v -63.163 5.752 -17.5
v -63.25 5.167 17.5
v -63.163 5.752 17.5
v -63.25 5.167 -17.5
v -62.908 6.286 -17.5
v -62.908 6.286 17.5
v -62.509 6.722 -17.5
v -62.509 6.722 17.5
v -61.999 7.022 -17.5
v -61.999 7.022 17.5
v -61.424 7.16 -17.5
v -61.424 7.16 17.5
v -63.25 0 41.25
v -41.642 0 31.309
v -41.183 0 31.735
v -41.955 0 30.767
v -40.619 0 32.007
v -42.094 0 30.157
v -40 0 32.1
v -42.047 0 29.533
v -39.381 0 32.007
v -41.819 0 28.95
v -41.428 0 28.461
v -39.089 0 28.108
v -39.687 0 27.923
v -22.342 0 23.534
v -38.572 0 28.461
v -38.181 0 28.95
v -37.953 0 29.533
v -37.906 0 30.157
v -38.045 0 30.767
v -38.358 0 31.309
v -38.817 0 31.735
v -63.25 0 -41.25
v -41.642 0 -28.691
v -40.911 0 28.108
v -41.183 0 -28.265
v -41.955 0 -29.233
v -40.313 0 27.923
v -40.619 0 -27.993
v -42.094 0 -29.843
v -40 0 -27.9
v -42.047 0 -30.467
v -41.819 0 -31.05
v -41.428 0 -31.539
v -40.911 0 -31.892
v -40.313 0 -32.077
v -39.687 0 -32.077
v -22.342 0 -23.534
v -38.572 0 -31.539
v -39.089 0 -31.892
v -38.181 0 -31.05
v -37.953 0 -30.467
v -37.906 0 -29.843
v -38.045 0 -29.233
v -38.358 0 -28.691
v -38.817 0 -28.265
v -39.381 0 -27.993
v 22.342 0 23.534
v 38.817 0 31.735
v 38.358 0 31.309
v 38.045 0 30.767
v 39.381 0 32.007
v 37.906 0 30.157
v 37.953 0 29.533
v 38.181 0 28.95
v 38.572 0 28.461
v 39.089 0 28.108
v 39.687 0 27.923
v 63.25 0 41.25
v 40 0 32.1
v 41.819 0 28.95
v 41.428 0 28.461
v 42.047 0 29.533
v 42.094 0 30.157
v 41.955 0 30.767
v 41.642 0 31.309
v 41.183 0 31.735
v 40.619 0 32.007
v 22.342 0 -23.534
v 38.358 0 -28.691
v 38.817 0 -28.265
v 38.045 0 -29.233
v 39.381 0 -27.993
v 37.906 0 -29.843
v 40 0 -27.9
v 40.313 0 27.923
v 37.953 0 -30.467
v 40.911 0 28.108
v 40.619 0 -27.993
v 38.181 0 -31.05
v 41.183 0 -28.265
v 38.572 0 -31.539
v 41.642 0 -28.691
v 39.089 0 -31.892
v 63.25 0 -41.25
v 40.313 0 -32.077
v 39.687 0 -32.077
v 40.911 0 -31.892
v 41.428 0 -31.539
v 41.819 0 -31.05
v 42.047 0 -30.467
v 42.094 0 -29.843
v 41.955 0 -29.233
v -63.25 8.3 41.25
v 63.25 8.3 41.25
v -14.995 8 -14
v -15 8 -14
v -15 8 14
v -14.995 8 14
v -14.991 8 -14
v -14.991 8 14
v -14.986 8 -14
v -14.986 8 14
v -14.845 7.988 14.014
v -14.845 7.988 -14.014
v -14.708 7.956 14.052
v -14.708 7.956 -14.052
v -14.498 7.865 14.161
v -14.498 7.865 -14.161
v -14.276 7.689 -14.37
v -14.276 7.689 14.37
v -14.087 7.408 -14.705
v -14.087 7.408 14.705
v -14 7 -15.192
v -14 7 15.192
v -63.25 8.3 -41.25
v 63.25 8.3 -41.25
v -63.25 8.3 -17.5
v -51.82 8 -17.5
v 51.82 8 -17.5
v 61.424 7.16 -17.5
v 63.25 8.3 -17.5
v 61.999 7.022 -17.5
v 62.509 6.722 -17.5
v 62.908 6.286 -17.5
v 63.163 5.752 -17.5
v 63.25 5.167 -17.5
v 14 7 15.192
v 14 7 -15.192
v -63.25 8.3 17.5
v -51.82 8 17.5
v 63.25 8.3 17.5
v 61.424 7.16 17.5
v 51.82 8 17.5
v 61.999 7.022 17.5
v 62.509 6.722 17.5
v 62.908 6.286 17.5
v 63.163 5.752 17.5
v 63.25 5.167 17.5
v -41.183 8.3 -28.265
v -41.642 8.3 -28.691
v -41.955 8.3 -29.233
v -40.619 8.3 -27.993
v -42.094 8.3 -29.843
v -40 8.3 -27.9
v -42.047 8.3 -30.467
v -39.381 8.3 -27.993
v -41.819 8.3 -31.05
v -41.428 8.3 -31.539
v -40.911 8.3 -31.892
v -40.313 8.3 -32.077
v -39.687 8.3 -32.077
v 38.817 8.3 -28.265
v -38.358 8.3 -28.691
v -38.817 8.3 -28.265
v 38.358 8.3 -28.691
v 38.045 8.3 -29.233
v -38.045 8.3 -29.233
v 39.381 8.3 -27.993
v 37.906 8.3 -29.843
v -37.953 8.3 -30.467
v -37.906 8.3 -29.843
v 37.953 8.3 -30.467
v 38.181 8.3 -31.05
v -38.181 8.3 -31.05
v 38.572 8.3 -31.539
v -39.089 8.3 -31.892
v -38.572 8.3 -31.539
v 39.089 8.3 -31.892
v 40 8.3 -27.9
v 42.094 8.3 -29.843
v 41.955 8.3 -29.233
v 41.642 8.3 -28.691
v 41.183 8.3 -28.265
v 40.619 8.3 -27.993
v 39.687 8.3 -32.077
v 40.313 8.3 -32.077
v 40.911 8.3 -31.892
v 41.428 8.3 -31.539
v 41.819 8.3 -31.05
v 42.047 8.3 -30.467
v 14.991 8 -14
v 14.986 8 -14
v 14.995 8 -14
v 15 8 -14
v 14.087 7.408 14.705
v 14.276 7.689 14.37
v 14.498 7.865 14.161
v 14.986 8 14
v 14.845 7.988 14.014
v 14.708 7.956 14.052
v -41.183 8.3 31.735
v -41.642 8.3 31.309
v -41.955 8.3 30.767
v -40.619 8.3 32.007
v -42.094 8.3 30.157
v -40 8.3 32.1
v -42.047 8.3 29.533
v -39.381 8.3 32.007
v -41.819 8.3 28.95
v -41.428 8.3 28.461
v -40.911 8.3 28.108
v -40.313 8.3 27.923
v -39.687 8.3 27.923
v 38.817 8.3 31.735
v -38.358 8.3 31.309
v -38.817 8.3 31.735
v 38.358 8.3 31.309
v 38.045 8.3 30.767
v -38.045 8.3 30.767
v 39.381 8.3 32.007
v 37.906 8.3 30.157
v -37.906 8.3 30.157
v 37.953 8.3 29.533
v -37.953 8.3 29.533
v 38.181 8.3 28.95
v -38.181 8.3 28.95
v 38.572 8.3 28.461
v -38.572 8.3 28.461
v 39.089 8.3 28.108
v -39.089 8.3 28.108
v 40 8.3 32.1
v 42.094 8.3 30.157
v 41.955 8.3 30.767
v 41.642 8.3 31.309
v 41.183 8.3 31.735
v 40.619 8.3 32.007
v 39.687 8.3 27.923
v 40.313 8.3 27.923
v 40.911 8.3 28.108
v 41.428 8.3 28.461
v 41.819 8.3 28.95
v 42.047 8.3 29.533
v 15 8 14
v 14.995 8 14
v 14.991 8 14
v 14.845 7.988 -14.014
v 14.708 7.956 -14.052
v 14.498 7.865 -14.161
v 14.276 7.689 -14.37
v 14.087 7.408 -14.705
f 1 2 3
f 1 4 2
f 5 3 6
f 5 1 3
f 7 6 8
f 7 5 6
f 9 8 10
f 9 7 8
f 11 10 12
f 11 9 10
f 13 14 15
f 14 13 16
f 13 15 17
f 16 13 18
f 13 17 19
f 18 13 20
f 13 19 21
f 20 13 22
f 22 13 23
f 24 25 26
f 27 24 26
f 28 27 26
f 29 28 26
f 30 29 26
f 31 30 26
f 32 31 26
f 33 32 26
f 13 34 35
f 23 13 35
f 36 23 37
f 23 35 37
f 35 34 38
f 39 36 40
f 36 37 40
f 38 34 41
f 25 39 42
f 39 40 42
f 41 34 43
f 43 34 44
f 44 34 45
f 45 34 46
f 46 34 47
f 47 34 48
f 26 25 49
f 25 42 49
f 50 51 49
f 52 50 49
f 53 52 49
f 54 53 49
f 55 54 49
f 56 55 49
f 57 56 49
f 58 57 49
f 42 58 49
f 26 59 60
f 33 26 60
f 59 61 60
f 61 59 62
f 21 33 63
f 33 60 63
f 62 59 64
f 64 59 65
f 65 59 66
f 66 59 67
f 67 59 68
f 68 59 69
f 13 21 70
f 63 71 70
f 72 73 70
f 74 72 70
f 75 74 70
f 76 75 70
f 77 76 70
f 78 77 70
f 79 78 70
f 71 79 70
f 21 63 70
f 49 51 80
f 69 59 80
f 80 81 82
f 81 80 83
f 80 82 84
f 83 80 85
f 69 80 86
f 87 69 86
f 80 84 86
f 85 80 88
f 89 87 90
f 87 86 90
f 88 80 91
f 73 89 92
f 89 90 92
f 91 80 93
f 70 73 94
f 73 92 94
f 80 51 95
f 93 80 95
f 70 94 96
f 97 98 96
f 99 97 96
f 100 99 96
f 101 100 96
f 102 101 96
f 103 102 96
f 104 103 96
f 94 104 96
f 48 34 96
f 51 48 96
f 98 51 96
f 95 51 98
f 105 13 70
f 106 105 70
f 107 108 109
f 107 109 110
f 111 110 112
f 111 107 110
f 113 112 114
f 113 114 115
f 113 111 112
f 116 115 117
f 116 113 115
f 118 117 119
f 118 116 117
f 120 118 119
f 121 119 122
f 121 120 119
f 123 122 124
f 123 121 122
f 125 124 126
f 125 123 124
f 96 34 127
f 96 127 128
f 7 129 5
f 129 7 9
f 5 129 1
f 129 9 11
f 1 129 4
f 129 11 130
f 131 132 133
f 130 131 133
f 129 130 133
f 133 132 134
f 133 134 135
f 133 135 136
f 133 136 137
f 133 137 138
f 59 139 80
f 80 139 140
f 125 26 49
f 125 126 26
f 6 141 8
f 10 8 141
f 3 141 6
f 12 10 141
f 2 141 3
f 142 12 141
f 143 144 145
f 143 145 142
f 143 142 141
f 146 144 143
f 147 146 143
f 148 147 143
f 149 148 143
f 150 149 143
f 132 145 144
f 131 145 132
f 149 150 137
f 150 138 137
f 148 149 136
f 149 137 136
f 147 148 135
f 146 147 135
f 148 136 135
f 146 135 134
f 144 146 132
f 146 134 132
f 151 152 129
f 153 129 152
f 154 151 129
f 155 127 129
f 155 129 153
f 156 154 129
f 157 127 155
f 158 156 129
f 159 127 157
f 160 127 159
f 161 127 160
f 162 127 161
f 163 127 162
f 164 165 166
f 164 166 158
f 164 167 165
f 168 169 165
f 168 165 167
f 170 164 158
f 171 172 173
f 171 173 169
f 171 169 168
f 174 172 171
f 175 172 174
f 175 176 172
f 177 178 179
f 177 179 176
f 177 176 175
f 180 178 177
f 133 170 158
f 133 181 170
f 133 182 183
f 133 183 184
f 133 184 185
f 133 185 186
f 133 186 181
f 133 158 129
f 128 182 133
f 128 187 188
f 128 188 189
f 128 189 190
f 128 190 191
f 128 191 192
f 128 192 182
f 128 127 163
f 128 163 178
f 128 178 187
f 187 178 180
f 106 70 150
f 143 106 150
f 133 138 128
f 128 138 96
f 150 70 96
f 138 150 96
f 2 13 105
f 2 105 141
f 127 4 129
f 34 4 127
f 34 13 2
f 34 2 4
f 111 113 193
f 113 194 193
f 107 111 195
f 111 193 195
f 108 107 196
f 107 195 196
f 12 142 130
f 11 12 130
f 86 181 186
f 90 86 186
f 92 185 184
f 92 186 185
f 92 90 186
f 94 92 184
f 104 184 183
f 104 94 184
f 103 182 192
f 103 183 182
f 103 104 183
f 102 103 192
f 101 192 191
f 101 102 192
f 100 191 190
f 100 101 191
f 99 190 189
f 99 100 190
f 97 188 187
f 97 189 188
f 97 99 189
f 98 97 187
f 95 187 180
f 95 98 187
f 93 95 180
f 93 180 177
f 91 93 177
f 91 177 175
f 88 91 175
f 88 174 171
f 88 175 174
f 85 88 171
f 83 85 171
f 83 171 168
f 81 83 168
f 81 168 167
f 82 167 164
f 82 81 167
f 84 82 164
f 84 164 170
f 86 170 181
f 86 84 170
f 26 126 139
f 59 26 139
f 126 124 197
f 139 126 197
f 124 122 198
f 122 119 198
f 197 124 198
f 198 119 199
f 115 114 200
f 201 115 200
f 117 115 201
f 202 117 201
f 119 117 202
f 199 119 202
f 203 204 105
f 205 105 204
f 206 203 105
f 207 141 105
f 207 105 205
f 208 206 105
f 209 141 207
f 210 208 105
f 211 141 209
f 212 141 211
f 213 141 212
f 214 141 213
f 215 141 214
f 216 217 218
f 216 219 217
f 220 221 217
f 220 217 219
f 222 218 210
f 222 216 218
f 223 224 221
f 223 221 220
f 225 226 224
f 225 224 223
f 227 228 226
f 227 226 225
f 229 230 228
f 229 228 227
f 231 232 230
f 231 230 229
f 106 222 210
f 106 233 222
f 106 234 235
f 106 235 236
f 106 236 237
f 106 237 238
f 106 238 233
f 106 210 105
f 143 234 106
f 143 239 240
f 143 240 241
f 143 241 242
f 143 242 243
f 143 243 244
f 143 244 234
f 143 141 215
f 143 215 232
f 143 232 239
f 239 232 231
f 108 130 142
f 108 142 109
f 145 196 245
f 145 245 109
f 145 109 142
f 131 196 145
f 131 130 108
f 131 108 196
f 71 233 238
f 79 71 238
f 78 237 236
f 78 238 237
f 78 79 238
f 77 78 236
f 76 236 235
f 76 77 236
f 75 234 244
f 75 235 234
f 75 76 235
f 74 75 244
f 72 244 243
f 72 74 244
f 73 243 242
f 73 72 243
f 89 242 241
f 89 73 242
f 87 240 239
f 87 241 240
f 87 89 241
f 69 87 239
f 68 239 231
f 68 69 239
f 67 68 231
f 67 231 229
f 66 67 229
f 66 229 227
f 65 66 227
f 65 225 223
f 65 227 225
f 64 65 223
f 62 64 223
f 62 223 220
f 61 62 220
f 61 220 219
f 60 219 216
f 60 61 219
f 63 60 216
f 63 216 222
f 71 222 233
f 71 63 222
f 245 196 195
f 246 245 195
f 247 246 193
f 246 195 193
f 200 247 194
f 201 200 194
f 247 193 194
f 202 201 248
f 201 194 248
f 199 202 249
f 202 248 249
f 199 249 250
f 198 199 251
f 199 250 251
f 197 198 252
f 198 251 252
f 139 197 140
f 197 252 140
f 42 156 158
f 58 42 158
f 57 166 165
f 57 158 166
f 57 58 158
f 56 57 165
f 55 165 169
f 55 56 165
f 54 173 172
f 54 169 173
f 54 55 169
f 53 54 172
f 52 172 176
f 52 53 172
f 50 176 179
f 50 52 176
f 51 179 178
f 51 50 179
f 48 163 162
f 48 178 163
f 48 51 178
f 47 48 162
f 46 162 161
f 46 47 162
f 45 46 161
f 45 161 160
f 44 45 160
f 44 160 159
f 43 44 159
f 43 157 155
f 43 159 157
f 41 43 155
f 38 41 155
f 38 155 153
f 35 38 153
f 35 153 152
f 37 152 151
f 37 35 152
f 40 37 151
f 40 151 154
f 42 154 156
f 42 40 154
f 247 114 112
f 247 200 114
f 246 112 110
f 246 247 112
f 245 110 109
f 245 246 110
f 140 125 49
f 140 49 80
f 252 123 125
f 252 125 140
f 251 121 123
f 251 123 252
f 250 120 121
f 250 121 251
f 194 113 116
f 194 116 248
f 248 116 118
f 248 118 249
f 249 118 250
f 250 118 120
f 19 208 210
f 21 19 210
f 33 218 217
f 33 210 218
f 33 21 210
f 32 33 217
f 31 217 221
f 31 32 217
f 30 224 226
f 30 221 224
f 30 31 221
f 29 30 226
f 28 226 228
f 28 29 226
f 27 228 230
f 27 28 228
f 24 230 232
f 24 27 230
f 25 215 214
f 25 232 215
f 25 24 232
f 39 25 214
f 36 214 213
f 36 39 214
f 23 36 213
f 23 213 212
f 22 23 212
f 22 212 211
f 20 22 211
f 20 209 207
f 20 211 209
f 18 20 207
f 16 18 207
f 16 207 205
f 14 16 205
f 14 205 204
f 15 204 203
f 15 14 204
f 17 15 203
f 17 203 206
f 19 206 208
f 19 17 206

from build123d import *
from OCP.BRepFilletAPI import BRepFilletAPI_MakeChamfer

# Parameters (mm, degrees)
SKETCH_1_W               = 126.5
SKETCH_1_H               = 82.5
SKETCH_1_W_2             = 28
SKETCH_1_H_2             = 28
EXTRUDE_1_DEPTH          = 8
SKETCH_2_W               = 126.5
SKETCH_2_H               = 23.75
EXTRUDE_2_DEPTH          = 0.3
CHAMFER_1_SIZE           = 1
CHAMFER_1_SIZE2          = 11.430052303
FILLET_1_R               = 2
FILLET_2_R               = 1
CUT_EXTRUDE_1_DEPTH      = 76.935005103
CUT_EXTRUDE_1_DEPTH_BACK = 76.935005103
SKETCH_3_R               = 2.1
CHAMFER_2_SIZE           = 8.342275148
CHAMFER_2_SIZE_2         = 7
CHAMFER_3_SIZE2          = 8
CHAMFER_3_SIZE           = 9.534028741


with BuildPart() as part:
    # Эскиз1 → Бобышка-Вытянуть1 (new body)
    with BuildSketch(Plane(origin=(0, 0, 0), x_dir=(1, 0, 0), z_dir=(0, 1, 0))):
        Rectangle(SKETCH_1_W, SKETCH_1_H)
        Rectangle(SKETCH_1_W_2, SKETCH_1_H_2, mode=Mode.SUBTRACT)
    extrude(amount=EXTRUDE_1_DEPTH)

    # Эскиз2 → Бобышка-Вытянуть2 (add)
    with BuildSketch(Plane(origin=(0, 8, 0), x_dir=(1, 0, 0), z_dir=(0, 1, 0))):
        with Locations((0, 29.375)):
            Rectangle(SKETCH_2_W, SKETCH_2_H)
        with Locations((0, -29.375)):
            Rectangle(SKETCH_2_W, SKETCH_2_H)
    extrude(amount=EXTRUDE_2_DEPTH)

    # Фаска1: one chamfer whose edges measure the first distance from different faces: ONE call of the kernel's chamfer builder (chamfer() names one face for all edges)
    chamfer_1_edges_1 = [part.edges().sort_by_distance(p)[0] for p in [
        (-63.25, 8, 0),
    ]]
    chamfer_1_side_1 = [part.faces().sort_by_distance(p)[0] for p in [
        (-63.25, 4.087708565, 0),
    ]]
    chamfer_1_edges_2 = [part.edges().sort_by_distance(p)[0] for p in [
        (63.25, 8, 0),
    ]]
    chamfer_1_side_2 = [part.faces().sort_by_distance(p)[0] for p in [
        (63.25, 4.087708565, 0),
    ]]
    chamfer_1 = BRepFilletAPI_MakeChamfer(part.part.solid().wrapped)
    for e in chamfer_1_edges_1:
        chamfer_1.Add(CHAMFER_1_SIZE, CHAMFER_1_SIZE2, e.wrapped, chamfer_1_side_1[0].wrapped)  # the first distance lies on this face
    for e in chamfer_1_edges_2:
        chamfer_1.Add(CHAMFER_1_SIZE, CHAMFER_1_SIZE2, e.wrapped, chamfer_1_side_2[0].wrapped)  # the first distance lies on this face
    add(Compound.cast(chamfer_1.Shape()), mode=Mode.REPLACE)

    # Скругление1
    fillet_1_edges = [part.edges().sort_by_distance(p)[0] for p in [
        (63.25, 7, 0),
        (-63.25, 7, 0),
    ]]
    fillet(fillet_1_edges, radius=FILLET_1_R)

    # Скругление2
    fillet_2_edges = [part.edges().sort_by_distance(p)[0] for p in [
        (-14, 8, 0),
        (14, 8, 0),
    ]]
    fillet(fillet_2_edges, radius=FILLET_2_R)

    # Эскиз3 → Вырез-Вытянуть1 (cut, two sides: drawn at the far end of the back side and taken through both)
    with BuildSketch(Plane(origin=(0, 8, 0), x_dir=(1, 0, 0), z_dir=(0, 1, 0)).offset(-CUT_EXTRUDE_1_DEPTH_BACK)):
        with Locations(Location((-40, 30, 0), (0, 0, 270))):
            Circle(SKETCH_3_R)
        with Locations(Location((40, 30, 0), (0, 0, 270))):
            Circle(SKETCH_3_R)
        with Locations(Location((-40, -30, 0), (0, 0, 270))):
            Circle(SKETCH_3_R)
        with Locations(Location((40, -30, 0), (0, 0, 270))):
            Circle(SKETCH_3_R)
    extrude(amount=CUT_EXTRUDE_1_DEPTH + CUT_EXTRUDE_1_DEPTH_BACK, mode=Mode.SUBTRACT)

    # Фаска2
    chamfer_2_edges_1 = [part.edges().sort_by_distance(p)[0] for p in [
        (14, 0, 0),
    ]]
    chamfer_2_side_1 = [part.faces().sort_by_distance(p)[0] for p in [
        (14.14, 0, 0),
    ]]
    chamfer_2_edges_2 = [part.edges().sort_by_distance(p)[0] for p in [
        (-14, 0, 0),
    ]]
    chamfer_2_side_2 = [part.faces().sort_by_distance(p)[0] for p in [
        (-14.14, 0, 0),
    ]]
    chamfer_2 = BRepFilletAPI_MakeChamfer(part.part.solid().wrapped)
    for e in chamfer_2_edges_1:
        chamfer_2.Add(CHAMFER_2_SIZE - 0.0001, CHAMFER_2_SIZE_2 - 0.0001, e.wrapped, chamfer_2_side_1[0].wrapped)
    for e in chamfer_2_edges_2:
        chamfer_2.Add(CHAMFER_2_SIZE - 0.0001, CHAMFER_2_SIZE_2 - 0.0001, e.wrapped, chamfer_2_side_2[0].wrapped)
    add(Compound.cast(chamfer_2.Shape()), mode=Mode.REPLACE)  # a hair under: the kernel refuses the full size

    # Фаска3
    chamfer_3_edges = [part.edges().sort_by_distance(p)[0] for p in [
        (0, 0, -14),
    ]]
    chamfer_3_side = [part.faces().sort_by_distance(p)[0] for p in [
        (0, 0, -14.16),
    ]]
    chamfer(chamfer_3_edges, length=CHAMFER_3_SIZE - 0.0001, length2=CHAMFER_3_SIZE2 - 0.0001, reference=chamfer_3_side[0])  # a hair under: the kernel refuses the full size
    chamfer_3_2_edges = [part.edges().sort_by_distance(p)[0] for p in [
        (0, 0, 14),
    ]]
    chamfer_3_2_side = [part.faces().sort_by_distance(p)[0] for p in [
        (0, 0, 14.16),
    ]]
    chamfer(chamfer_3_2_edges, length=CHAMFER_3_SIZE - 0.0001, length2=CHAMFER_3_SIZE2 - 0.0001, reference=chamfer_3_2_side[0])  # a hair under: the kernel refuses the full size


solid = part.part
